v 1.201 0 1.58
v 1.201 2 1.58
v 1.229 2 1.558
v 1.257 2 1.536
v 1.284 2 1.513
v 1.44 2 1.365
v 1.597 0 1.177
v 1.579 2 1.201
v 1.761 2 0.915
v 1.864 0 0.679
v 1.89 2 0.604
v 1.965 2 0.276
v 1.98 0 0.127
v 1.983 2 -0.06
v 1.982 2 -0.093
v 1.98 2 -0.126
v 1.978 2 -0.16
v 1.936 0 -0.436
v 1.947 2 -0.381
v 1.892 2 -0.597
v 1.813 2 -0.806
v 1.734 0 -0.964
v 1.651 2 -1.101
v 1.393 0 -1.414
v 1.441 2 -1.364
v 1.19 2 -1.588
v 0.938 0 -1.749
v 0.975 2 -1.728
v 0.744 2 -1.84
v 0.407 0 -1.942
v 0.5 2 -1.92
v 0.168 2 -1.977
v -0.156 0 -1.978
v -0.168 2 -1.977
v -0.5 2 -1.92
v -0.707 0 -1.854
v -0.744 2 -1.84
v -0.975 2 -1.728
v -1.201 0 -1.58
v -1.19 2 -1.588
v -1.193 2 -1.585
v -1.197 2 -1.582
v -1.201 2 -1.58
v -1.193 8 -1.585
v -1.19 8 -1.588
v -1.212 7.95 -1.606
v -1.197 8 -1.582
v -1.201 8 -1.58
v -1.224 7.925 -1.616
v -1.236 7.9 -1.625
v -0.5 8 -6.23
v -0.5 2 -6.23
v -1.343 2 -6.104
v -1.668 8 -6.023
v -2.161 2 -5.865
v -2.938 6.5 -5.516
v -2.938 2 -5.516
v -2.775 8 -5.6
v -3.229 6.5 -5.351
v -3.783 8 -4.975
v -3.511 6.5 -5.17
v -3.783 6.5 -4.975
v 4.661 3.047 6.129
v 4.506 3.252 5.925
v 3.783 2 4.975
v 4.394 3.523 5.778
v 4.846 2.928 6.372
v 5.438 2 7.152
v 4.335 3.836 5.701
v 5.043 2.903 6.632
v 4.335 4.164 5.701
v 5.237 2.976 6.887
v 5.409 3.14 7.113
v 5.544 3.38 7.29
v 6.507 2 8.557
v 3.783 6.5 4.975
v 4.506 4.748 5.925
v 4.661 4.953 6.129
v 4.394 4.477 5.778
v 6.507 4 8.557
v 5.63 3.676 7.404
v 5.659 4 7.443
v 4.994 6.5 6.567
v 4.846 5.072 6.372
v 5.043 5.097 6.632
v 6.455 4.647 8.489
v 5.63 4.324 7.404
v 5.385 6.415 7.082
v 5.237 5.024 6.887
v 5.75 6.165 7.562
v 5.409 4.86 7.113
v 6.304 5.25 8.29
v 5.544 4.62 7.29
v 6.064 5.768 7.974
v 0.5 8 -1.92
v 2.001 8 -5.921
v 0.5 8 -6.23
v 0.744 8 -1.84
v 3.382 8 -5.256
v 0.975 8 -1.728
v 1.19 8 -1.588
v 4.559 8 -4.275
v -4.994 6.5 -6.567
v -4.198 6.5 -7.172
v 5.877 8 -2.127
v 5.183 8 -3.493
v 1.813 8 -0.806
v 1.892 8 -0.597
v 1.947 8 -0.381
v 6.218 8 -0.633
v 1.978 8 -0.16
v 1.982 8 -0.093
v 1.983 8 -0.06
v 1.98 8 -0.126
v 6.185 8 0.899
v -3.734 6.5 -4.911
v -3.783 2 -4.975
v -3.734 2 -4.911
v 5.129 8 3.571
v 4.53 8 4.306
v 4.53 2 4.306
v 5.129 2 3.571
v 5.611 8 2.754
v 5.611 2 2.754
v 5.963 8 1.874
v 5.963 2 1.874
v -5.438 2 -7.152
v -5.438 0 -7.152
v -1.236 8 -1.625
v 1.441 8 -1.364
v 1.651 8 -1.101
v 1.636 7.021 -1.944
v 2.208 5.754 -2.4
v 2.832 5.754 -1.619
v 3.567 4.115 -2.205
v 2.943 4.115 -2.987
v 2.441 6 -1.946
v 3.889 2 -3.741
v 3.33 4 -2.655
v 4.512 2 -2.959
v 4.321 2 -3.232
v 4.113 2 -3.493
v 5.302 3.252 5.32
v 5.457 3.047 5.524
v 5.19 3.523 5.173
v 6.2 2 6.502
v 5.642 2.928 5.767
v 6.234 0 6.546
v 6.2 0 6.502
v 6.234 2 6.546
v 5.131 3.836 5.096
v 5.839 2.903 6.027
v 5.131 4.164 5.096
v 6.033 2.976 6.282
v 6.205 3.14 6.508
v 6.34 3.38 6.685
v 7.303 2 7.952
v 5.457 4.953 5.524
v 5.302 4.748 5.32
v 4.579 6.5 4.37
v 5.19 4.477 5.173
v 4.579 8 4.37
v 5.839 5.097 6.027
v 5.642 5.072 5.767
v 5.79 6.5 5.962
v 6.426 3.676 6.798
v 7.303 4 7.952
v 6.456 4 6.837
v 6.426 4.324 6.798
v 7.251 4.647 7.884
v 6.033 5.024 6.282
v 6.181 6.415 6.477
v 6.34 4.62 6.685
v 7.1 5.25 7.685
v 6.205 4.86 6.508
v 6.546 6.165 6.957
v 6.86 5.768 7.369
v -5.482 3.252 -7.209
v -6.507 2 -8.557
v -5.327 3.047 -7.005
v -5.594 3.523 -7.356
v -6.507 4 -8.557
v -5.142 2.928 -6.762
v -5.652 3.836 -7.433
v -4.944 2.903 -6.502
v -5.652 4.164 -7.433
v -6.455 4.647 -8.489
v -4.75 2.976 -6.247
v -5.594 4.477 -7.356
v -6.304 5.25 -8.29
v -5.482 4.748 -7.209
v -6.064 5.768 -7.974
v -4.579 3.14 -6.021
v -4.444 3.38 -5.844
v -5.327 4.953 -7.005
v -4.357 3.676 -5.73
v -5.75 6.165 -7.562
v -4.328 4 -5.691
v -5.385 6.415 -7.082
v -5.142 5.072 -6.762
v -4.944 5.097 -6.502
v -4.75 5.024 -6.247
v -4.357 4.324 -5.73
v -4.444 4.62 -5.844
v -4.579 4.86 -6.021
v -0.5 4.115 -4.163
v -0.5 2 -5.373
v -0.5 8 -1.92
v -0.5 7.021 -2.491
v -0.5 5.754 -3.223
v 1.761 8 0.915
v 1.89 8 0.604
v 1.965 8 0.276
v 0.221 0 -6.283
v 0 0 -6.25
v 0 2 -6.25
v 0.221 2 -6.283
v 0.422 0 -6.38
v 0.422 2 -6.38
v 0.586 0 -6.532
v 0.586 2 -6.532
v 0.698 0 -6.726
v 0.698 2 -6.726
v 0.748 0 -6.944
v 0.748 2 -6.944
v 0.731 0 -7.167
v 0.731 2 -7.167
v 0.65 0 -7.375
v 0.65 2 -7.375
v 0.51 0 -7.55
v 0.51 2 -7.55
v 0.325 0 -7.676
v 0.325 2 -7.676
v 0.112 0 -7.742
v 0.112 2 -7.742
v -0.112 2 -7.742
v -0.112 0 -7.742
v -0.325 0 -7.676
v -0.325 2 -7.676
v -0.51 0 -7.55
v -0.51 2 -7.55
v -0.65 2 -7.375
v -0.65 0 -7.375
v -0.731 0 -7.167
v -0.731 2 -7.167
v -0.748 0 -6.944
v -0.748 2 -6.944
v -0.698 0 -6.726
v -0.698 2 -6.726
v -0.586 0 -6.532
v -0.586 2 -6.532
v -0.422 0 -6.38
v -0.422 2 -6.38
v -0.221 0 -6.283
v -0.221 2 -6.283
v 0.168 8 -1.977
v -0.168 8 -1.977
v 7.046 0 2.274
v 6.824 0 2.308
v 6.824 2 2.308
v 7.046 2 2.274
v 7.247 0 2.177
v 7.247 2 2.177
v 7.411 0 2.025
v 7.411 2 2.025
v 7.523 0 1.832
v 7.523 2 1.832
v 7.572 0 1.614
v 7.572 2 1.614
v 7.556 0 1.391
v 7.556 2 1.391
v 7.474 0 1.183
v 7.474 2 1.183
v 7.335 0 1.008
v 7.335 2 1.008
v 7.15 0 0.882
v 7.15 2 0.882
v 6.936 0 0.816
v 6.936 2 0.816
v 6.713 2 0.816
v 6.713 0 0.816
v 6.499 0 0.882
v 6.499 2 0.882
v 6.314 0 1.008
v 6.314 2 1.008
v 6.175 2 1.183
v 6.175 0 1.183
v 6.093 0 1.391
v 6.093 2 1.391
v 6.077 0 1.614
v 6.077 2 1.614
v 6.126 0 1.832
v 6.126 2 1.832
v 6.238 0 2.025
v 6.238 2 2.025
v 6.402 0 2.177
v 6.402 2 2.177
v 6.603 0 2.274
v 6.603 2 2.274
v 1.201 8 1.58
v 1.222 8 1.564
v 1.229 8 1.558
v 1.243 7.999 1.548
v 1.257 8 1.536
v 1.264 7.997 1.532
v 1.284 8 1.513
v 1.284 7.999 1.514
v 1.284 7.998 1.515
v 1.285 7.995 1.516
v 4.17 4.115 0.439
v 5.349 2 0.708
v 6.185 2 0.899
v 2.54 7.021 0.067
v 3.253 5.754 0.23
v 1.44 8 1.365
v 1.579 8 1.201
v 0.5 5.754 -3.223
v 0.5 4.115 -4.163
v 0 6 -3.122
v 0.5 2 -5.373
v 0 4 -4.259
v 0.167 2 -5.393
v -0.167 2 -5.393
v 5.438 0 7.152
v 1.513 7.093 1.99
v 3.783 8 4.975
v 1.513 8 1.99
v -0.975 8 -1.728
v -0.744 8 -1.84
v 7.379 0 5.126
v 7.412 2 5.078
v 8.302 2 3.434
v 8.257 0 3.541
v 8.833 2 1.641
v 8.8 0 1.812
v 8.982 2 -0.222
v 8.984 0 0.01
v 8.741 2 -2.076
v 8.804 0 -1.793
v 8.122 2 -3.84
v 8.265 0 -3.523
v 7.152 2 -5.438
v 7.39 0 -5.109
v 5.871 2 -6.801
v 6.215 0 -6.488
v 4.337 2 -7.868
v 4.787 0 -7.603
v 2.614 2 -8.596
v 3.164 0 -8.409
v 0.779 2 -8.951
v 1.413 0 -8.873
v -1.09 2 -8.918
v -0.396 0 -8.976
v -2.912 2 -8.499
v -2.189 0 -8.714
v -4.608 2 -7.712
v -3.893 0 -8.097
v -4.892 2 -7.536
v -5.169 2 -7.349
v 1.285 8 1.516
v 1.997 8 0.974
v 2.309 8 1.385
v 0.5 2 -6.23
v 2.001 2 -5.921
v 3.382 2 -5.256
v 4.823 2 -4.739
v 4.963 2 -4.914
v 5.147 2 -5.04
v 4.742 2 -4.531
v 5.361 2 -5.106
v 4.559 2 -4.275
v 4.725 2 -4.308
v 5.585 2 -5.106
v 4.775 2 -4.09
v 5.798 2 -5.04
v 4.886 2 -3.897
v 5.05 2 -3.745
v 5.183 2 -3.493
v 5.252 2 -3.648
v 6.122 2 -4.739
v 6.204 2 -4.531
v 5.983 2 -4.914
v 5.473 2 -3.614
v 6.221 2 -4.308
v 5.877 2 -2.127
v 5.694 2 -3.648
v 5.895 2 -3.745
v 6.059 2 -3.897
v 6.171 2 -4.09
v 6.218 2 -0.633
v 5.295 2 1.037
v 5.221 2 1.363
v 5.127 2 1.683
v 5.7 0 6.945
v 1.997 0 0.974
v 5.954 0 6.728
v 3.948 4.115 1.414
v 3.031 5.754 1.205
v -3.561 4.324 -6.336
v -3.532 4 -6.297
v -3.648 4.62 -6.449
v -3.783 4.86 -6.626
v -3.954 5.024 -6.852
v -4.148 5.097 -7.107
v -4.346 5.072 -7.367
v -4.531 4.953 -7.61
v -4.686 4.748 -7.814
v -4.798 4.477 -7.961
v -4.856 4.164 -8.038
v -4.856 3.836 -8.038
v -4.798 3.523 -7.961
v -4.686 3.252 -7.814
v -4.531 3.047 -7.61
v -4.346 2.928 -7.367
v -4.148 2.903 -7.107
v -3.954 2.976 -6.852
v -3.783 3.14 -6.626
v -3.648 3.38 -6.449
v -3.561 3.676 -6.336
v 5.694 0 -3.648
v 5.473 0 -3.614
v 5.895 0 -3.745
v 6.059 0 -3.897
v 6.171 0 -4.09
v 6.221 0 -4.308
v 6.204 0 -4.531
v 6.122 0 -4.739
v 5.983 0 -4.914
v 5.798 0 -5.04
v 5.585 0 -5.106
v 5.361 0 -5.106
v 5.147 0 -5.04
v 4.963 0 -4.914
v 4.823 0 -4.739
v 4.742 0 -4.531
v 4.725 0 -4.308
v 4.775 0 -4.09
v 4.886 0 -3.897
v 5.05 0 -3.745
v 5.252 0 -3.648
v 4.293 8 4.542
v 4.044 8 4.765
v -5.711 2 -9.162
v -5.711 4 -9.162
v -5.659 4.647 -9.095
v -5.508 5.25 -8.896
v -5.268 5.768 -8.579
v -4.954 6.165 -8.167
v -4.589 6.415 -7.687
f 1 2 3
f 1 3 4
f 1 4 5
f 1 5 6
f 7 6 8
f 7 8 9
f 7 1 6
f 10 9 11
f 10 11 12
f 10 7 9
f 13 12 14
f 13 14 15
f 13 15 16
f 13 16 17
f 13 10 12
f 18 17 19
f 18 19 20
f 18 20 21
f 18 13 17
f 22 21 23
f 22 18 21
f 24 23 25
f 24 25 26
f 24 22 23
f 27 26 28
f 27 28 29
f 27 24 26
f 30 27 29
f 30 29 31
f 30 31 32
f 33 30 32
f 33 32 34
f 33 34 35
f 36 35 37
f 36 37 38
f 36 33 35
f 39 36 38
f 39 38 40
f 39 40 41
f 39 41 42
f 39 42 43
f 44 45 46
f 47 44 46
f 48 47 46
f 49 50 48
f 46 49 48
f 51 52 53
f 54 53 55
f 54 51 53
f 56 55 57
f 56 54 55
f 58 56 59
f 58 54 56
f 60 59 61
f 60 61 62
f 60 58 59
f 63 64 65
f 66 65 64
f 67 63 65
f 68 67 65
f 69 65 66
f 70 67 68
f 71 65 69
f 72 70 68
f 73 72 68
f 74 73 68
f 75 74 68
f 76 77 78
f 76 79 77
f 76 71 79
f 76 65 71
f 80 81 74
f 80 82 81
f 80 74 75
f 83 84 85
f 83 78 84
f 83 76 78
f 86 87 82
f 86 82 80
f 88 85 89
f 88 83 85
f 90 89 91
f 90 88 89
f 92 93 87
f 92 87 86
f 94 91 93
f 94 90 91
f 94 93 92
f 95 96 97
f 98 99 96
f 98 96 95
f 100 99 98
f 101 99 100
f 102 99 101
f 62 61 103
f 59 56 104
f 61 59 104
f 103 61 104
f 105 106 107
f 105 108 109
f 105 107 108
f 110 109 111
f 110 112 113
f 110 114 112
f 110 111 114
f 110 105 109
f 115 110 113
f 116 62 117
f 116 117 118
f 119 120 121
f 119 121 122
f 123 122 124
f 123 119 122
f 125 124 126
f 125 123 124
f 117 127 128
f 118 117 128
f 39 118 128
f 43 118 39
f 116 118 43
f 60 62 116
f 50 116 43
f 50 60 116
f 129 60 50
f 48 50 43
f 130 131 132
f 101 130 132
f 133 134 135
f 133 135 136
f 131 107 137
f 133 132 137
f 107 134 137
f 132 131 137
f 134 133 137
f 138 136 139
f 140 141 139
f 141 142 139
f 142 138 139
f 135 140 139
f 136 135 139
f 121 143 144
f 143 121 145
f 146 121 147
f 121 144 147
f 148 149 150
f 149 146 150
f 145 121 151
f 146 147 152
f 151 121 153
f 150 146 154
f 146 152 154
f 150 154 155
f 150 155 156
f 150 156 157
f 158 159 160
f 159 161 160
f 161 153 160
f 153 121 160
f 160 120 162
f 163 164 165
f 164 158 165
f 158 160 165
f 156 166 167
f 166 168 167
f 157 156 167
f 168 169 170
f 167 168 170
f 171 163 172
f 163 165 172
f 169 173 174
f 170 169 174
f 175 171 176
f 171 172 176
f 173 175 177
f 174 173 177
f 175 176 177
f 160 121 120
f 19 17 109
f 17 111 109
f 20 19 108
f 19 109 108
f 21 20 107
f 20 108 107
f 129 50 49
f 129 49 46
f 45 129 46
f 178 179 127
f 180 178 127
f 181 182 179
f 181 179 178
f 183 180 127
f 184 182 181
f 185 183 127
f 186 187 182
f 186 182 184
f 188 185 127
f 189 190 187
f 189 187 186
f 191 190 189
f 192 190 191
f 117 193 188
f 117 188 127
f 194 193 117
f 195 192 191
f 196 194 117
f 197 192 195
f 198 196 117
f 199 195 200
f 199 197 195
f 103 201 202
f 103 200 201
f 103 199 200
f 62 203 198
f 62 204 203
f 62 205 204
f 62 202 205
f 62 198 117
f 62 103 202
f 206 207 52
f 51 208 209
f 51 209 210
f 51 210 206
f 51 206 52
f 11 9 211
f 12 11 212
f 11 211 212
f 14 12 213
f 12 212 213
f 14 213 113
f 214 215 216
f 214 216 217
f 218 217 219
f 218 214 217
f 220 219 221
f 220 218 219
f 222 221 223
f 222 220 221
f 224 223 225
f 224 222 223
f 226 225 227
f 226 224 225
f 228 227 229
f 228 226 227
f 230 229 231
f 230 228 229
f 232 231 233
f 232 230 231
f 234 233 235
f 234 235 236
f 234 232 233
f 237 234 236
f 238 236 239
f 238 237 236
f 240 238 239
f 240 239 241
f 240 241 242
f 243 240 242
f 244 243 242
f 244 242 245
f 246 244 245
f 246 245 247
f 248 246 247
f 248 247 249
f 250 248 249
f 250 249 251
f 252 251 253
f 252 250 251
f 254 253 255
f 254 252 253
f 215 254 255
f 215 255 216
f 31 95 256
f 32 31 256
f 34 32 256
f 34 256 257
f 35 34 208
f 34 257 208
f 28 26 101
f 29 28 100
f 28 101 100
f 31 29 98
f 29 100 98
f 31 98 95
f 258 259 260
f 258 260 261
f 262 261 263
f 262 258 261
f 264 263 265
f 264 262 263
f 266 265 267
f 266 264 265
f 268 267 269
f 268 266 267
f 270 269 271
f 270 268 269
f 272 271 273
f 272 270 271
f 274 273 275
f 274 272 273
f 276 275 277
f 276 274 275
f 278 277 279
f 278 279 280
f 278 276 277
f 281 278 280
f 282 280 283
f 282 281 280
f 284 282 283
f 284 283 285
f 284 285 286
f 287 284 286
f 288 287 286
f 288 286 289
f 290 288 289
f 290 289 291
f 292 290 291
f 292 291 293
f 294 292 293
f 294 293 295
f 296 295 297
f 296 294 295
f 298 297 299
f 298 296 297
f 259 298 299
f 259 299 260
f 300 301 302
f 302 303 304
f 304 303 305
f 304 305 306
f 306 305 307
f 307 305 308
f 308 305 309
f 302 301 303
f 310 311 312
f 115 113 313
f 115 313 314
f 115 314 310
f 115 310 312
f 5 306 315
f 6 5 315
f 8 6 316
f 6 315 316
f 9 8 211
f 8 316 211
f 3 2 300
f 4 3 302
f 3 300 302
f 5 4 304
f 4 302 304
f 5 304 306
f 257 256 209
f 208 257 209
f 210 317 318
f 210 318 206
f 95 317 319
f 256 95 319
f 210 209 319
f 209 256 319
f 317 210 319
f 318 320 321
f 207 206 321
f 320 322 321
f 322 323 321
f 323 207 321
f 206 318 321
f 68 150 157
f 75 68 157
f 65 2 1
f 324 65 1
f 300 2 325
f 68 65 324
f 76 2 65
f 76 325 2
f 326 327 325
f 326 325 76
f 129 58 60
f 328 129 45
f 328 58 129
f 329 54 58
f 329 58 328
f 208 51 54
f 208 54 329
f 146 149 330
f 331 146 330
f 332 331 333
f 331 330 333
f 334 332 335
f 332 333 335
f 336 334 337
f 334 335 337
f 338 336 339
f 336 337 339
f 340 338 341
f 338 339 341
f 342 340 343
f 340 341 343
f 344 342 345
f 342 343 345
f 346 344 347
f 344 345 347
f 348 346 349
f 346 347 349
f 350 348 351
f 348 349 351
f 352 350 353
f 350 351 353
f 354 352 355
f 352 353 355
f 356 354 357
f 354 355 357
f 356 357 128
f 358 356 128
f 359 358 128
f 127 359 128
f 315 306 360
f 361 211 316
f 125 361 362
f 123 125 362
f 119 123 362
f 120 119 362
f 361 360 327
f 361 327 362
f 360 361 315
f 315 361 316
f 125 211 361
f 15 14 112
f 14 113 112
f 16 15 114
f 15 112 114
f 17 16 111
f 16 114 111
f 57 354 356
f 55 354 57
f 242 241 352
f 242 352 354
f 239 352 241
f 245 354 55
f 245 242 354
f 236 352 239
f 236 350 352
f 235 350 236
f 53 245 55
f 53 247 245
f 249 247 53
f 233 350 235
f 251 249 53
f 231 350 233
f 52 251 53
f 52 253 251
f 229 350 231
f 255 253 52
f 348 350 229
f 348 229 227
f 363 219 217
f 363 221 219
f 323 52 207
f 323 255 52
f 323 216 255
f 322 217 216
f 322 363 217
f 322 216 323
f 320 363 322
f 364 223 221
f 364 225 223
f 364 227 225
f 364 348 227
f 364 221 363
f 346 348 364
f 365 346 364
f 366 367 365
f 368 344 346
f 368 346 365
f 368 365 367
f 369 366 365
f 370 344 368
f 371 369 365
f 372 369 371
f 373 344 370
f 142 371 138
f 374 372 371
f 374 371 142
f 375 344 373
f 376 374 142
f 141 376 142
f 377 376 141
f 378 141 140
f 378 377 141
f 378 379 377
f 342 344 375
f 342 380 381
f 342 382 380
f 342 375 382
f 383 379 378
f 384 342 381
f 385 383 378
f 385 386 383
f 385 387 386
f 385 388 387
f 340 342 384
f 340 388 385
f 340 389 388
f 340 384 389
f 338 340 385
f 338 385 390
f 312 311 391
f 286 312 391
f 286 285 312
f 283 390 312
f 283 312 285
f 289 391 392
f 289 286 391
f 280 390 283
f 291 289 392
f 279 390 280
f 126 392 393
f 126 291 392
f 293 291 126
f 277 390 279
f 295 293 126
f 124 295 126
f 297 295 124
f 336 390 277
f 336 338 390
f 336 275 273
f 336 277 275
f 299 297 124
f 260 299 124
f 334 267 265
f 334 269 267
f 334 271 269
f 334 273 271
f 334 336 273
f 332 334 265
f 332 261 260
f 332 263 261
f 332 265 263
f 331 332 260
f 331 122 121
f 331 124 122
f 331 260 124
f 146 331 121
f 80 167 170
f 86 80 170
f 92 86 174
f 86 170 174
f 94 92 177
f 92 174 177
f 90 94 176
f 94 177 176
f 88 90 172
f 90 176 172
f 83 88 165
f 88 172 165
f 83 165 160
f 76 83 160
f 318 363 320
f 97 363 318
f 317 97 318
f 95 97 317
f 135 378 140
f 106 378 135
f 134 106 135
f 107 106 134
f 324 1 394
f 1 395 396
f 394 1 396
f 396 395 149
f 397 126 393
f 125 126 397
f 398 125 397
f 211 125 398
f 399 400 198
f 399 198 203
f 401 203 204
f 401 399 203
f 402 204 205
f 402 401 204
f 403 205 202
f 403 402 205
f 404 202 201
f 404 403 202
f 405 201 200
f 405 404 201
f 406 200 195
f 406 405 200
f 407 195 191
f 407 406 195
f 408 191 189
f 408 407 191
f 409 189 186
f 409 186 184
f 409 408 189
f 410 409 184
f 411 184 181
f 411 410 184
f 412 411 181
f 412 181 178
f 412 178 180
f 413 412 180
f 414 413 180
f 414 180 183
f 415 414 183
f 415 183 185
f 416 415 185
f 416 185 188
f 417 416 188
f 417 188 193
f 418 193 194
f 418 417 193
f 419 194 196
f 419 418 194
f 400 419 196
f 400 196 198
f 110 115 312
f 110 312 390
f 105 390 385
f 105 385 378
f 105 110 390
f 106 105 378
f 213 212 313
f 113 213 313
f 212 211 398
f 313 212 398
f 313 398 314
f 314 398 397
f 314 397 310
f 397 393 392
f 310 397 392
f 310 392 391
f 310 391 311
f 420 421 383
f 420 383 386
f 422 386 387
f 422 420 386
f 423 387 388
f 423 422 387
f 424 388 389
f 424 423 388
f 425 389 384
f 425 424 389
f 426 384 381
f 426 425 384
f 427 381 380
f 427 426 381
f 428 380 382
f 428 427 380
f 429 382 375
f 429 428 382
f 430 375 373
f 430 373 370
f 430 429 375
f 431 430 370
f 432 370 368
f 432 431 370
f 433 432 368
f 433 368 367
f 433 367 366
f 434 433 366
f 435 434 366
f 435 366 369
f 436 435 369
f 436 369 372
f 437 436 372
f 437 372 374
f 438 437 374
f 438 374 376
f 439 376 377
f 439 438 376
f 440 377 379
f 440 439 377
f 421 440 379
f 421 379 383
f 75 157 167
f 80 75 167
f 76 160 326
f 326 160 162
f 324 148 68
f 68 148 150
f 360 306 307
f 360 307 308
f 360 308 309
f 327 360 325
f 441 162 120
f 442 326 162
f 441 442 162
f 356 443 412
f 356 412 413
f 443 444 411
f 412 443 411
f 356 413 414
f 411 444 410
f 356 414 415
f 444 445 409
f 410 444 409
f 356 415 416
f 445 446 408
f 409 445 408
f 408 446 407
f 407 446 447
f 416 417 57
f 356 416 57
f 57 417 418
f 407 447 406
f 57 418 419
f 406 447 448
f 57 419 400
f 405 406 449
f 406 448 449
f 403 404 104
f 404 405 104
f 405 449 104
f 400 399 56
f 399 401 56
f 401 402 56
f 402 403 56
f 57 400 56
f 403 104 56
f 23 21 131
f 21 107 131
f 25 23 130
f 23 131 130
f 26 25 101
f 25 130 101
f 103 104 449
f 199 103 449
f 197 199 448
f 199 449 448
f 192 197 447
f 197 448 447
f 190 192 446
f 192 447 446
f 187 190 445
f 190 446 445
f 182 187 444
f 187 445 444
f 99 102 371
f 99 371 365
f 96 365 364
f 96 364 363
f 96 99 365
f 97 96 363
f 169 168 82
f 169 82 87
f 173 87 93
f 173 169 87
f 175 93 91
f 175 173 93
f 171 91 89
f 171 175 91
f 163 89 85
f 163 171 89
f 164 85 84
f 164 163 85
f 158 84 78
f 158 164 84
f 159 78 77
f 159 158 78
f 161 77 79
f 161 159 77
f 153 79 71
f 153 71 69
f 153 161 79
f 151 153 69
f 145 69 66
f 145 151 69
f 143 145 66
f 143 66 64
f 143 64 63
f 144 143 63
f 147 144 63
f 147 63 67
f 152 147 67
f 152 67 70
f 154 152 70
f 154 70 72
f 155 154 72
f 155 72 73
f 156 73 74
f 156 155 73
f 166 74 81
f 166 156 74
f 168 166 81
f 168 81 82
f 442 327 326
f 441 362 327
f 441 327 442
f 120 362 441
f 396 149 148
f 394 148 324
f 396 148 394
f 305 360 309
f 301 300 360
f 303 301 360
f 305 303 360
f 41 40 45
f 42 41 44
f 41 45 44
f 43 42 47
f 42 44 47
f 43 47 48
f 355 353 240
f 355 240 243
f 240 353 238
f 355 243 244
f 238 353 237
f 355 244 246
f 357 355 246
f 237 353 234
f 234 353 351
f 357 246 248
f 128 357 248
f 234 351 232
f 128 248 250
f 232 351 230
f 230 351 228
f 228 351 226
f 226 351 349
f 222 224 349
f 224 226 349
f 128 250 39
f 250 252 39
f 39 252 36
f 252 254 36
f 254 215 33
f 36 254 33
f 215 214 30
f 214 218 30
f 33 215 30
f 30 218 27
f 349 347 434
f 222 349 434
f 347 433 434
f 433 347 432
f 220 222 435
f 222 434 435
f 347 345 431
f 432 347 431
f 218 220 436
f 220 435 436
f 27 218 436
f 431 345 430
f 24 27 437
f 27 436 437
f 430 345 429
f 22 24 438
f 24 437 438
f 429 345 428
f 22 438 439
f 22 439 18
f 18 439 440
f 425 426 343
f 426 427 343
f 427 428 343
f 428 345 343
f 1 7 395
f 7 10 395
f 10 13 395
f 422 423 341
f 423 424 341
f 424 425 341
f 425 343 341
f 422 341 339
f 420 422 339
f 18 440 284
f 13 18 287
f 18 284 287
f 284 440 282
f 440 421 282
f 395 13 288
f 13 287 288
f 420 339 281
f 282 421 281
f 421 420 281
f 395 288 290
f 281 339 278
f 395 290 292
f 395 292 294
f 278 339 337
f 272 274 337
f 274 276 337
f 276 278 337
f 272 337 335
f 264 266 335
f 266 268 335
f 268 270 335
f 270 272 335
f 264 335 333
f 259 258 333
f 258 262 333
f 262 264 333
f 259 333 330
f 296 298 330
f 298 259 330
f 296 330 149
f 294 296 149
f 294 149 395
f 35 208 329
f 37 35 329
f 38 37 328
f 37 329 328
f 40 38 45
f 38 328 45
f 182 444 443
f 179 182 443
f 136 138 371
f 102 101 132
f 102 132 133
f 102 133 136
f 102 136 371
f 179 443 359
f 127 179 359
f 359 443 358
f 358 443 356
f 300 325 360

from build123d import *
from build123d.topology import SkipClean

# Parameters (mm, degrees)
SKETCH1_R               = 8.984375
SKETCH1_R_2             = 1.984375
SKETCH1_R_3             = 0.75
BOSS_EXTRUDE1_DEPTH     = 2
SKETCH6_W               = 17.96875
SKETCH6_H               = 8
CUT_EXTRUDE1_DEPTH      = 16.014593
BOSS_EXTRUDE4_START     = -1
BOSS_EXTRUDE4_OUTLINE_R = 1.1
BOSS_EXTRUDE4_DEPTH     = 1


with BuildPart() as part:
    # Sketch1 → Boss-Extrude1 (new body)
    with BuildSketch(Plane(origin=(0, 0, 0), x_dir=(1, 0, 0), z_dir=(0, 1, 0))):
        with Locations(Location((0, 0, 0), (0, 0, 270))):
            Circle(SKETCH1_R)
        with Locations(Location((0, 0, 0), (0, 0, 270))):
            Circle(SKETCH1_R_2, mode=Mode.SUBTRACT)
        with Locations(Location((0, 7, 0), (0, 0, 270))):
            Circle(SKETCH1_R_3, mode=Mode.SUBTRACT)
        with Locations(Location((5.47282, 4.364429, 0), (0, 0, 270))):
            Circle(SKETCH1_R_3, mode=Mode.SUBTRACT)
        with Locations(Location((6.824495, -1.557647, 0), (0, 0, 270))):
            Circle(SKETCH1_R_3, mode=Mode.SUBTRACT)
        with Locations(Location((3.037186, -6.306782, 0), (0, 0, 270))):
            Circle(SKETCH1_R_3, mode=Mode.SUBTRACT)
        with Locations(Location((-3.037186, -6.306782, 0), (0, 0, 270))):
            Circle(SKETCH1_R_3, mode=Mode.SUBTRACT)
        with Locations(Location((-6.824495, -1.557647, 0), (0, 0, 270))):
            Circle(SKETCH1_R_3, mode=Mode.SUBTRACT)
        with Locations(Location((-5.47282, 4.364429, 0), (0, 0, 270))):
            Circle(SKETCH1_R_3, mode=Mode.SUBTRACT)
    extrude(amount=BOSS_EXTRUDE1_DEPTH)

    # Sweep1: sweep along a path in Sketch3
    with SkipClean():  # the faces are left unmerged after this step: merging them gives an invalid solid
        with BuildLine(Plane(origin=(0, 0, 0), x_dir=(0, 0, -1), z_dir=(1, 0, 0))) as sweep1_path:
            Line((0, 2), (0, 8))
        # Sketch2 → Sweep1 (sweep)
        with BuildSketch(Plane(origin=(0, 2, 0), x_dir=(1, 0, 0), z_dir=(0, 1, 0))):
            with BuildLine():
                Line((-0.5, 6.229968), (-0.5, 1.92035))
                ThreePointArc((-0.5, 1.92035), (-0.860988, 1.78786), (-1.189645, 1.588234))
                Line((-1.189645, 1.588234), (-4.55904, 4.275237))
                ThreePointArc((-4.55904, 4.275237), (-2.711773, 5.631055), (-0.5, 6.229968))
            make_face()
            with BuildLine():
                Line((0.5, 6.229968), (0.5, 1.92035))
                ThreePointArc((0.5, 1.92035), (0.860988, 1.78786), (1.189645, 1.588234))
                Line((1.189645, 1.588234), (4.55904, 4.275237))
                ThreePointArc((4.55904, 4.275237), (2.711773, 5.631055), (0.5, 6.229968))
            make_face()
            with BuildLine():
                Line((5.18253, 3.493406), (1.813135, 0.806403))
                ThreePointArc((1.813135, 0.806403), (1.934623, 0.441565), (1.983463, 0.060146))
                Line((1.983463, 0.060146), (6.18503, -0.898834))
                ThreePointArc((6.18503, -0.898834), (6.093299, 1.390756), (5.18253, 3.493406))
            make_face()
            with BuildLine():
                Line((5.962509, -1.873762), (1.760942, -0.914782))
                ThreePointArc((1.760942, -0.914782), (1.551447, -1.237238), (1.283693, -1.513234))
                Line((1.283693, -1.513234), (3.153566, -5.396065))
                ThreePointArc((3.153566, -5.396065), (4.886447, -3.896811), (5.962509, -1.873762))
            make_face()
            with BuildLine():
                Line((2.252597, -5.829949), (0.382724, -1.947117))
                ThreePointArc((0.382724, -1.947117), (0, -1.984375), (-0.382724, -1.947117))
                Line((-0.382724, -1.947117), (-2.252597, -5.829949))
                ThreePointArc((-2.252597, -5.829949), (0, -6.25), (2.252597, -5.829949))
            make_face()
            with BuildLine():
                Line((-3.153566, -5.396065), (-1.283693, -1.513234))
                ThreePointArc((-1.283693, -1.513234), (-1.551447, -1.237238), (-1.760942, -0.914782))
                Line((-1.760942, -0.914782), (-5.962509, -1.873762))
                ThreePointArc((-5.962509, -1.873762), (-4.886447, -3.896811), (-3.153566, -5.396065))
            make_face()
            with BuildLine():
                Line((-6.18503, -0.898834), (-1.983463, 0.060146))
                ThreePointArc((-1.983463, 0.060146), (-1.934623, 0.441565), (-1.813135, 0.806403))
                Line((-1.813135, 0.806403), (-5.18253, 3.493406))
                ThreePointArc((-5.18253, 3.493406), (-6.093299, 1.390756), (-6.18503, -0.898834))
            make_face()
        sweep(path=sweep1_path.line)

    # Sketch4 → Revolve1 (revolve)
    with SkipClean():  # the faces are left unmerged after this step: merging them gives an invalid solid
        with BuildSketch(Plane(origin=(0, 0, 0), x_dir=(0, 0, -1), z_dir=(1, 0, 0)), mode=Mode.PRIVATE) as revolve1_sk:
            Polygon((-5.396065, 2), (-1.984375, 2), (-1.984375, 8), align=None)
        revolve(revolve1_sk.sketch.rotate(Axis((0, 0, 0), (0, 1, 0)), 165.405971), axis=Axis((0, 0, 0), (0, 1, 0)))

    # Sketch6 → Cut-Extrude1 (cut, through all)
    with BuildSketch(Plane(origin=(0, 0, 0), x_dir=(0.6052939880428899, 0, 0.7960020025346255), z_dir=(-0.7960020025346255, 0, 0.6052939880428899))):
        with Locations((0, 4)):
            Rectangle(SKETCH6_W, SKETCH6_H)
    extrude(amount=CUT_EXTRUDE1_DEPTH, mode=Mode.SUBTRACT)

    # Boss-Extrude4: read off the stored shape, not the designer's step
    # Boss-Extrude4 outline → Boss-Extrude4 (add)
    # profile 1 of 2: a face of its own
    with BuildSketch(Plane(origin=(0, 0, 0), x_dir=(0.60529398804289, 0, 0.7960020025346255), z_dir=(-0.7960020025346254, 0, 0.6052939880428899)).offset(BOSS_EXTRUDE4_START)):
        with BuildLine():
            Line((-6.169481, 6.5), (-8.25, 6.5))
            ThreePointArc((-8.25, 6.5), (-10.017767, 5.767767), (-10.75, 4))
            Line((-10.75, 4), (-10.75, 2))
            Line((-10.75, 2), (-6.169481, 2))
            Line((-6.169481, 2), (-6.169481, 6.5))
        make_face()
        with Locations((-8.25, 4)):
            Circle(BOSS_EXTRUDE4_OUTLINE_R, mode=Mode.SUBTRACT)
    # profile 2 of 2: a face of its own
    with BuildSketch(Plane(origin=(0, 0, 0), x_dir=(0.60529398804289, 0, 0.7960020025346255), z_dir=(-0.7960020025346254, 0, 0.6052939880428899)).offset(BOSS_EXTRUDE4_START)):
        with BuildLine():
            Line((8.984375, 0), (8.984375, 2))
            Line((8.984375, 2), (10.75, 2))
            Line((10.75, 2), (10.75, 4))
            ThreePointArc((10.75, 4), (10.017767, 5.767767), (8.25, 6.5))
            Line((8.25, 6.5), (6.25, 6.5))
            Line((6.25, 6.5), (6.25, 8))
            Line((6.25, 8), (2.500266, 8))
            Line((2.500266, 8), (2.500266, 7.092723))
            Line((2.500266, 7.092723), (1.984375, 8))
            Line((1.984375, 8), (1.984375, 0))
            Line((1.984375, 0), (8.984375, 0))
        make_face()
        with Locations((8.25, 4)):
            Circle(BOSS_EXTRUDE4_OUTLINE_R, mode=Mode.SUBTRACT)
    extrude(amount=BOSS_EXTRUDE4_DEPTH)


solid = part.part
